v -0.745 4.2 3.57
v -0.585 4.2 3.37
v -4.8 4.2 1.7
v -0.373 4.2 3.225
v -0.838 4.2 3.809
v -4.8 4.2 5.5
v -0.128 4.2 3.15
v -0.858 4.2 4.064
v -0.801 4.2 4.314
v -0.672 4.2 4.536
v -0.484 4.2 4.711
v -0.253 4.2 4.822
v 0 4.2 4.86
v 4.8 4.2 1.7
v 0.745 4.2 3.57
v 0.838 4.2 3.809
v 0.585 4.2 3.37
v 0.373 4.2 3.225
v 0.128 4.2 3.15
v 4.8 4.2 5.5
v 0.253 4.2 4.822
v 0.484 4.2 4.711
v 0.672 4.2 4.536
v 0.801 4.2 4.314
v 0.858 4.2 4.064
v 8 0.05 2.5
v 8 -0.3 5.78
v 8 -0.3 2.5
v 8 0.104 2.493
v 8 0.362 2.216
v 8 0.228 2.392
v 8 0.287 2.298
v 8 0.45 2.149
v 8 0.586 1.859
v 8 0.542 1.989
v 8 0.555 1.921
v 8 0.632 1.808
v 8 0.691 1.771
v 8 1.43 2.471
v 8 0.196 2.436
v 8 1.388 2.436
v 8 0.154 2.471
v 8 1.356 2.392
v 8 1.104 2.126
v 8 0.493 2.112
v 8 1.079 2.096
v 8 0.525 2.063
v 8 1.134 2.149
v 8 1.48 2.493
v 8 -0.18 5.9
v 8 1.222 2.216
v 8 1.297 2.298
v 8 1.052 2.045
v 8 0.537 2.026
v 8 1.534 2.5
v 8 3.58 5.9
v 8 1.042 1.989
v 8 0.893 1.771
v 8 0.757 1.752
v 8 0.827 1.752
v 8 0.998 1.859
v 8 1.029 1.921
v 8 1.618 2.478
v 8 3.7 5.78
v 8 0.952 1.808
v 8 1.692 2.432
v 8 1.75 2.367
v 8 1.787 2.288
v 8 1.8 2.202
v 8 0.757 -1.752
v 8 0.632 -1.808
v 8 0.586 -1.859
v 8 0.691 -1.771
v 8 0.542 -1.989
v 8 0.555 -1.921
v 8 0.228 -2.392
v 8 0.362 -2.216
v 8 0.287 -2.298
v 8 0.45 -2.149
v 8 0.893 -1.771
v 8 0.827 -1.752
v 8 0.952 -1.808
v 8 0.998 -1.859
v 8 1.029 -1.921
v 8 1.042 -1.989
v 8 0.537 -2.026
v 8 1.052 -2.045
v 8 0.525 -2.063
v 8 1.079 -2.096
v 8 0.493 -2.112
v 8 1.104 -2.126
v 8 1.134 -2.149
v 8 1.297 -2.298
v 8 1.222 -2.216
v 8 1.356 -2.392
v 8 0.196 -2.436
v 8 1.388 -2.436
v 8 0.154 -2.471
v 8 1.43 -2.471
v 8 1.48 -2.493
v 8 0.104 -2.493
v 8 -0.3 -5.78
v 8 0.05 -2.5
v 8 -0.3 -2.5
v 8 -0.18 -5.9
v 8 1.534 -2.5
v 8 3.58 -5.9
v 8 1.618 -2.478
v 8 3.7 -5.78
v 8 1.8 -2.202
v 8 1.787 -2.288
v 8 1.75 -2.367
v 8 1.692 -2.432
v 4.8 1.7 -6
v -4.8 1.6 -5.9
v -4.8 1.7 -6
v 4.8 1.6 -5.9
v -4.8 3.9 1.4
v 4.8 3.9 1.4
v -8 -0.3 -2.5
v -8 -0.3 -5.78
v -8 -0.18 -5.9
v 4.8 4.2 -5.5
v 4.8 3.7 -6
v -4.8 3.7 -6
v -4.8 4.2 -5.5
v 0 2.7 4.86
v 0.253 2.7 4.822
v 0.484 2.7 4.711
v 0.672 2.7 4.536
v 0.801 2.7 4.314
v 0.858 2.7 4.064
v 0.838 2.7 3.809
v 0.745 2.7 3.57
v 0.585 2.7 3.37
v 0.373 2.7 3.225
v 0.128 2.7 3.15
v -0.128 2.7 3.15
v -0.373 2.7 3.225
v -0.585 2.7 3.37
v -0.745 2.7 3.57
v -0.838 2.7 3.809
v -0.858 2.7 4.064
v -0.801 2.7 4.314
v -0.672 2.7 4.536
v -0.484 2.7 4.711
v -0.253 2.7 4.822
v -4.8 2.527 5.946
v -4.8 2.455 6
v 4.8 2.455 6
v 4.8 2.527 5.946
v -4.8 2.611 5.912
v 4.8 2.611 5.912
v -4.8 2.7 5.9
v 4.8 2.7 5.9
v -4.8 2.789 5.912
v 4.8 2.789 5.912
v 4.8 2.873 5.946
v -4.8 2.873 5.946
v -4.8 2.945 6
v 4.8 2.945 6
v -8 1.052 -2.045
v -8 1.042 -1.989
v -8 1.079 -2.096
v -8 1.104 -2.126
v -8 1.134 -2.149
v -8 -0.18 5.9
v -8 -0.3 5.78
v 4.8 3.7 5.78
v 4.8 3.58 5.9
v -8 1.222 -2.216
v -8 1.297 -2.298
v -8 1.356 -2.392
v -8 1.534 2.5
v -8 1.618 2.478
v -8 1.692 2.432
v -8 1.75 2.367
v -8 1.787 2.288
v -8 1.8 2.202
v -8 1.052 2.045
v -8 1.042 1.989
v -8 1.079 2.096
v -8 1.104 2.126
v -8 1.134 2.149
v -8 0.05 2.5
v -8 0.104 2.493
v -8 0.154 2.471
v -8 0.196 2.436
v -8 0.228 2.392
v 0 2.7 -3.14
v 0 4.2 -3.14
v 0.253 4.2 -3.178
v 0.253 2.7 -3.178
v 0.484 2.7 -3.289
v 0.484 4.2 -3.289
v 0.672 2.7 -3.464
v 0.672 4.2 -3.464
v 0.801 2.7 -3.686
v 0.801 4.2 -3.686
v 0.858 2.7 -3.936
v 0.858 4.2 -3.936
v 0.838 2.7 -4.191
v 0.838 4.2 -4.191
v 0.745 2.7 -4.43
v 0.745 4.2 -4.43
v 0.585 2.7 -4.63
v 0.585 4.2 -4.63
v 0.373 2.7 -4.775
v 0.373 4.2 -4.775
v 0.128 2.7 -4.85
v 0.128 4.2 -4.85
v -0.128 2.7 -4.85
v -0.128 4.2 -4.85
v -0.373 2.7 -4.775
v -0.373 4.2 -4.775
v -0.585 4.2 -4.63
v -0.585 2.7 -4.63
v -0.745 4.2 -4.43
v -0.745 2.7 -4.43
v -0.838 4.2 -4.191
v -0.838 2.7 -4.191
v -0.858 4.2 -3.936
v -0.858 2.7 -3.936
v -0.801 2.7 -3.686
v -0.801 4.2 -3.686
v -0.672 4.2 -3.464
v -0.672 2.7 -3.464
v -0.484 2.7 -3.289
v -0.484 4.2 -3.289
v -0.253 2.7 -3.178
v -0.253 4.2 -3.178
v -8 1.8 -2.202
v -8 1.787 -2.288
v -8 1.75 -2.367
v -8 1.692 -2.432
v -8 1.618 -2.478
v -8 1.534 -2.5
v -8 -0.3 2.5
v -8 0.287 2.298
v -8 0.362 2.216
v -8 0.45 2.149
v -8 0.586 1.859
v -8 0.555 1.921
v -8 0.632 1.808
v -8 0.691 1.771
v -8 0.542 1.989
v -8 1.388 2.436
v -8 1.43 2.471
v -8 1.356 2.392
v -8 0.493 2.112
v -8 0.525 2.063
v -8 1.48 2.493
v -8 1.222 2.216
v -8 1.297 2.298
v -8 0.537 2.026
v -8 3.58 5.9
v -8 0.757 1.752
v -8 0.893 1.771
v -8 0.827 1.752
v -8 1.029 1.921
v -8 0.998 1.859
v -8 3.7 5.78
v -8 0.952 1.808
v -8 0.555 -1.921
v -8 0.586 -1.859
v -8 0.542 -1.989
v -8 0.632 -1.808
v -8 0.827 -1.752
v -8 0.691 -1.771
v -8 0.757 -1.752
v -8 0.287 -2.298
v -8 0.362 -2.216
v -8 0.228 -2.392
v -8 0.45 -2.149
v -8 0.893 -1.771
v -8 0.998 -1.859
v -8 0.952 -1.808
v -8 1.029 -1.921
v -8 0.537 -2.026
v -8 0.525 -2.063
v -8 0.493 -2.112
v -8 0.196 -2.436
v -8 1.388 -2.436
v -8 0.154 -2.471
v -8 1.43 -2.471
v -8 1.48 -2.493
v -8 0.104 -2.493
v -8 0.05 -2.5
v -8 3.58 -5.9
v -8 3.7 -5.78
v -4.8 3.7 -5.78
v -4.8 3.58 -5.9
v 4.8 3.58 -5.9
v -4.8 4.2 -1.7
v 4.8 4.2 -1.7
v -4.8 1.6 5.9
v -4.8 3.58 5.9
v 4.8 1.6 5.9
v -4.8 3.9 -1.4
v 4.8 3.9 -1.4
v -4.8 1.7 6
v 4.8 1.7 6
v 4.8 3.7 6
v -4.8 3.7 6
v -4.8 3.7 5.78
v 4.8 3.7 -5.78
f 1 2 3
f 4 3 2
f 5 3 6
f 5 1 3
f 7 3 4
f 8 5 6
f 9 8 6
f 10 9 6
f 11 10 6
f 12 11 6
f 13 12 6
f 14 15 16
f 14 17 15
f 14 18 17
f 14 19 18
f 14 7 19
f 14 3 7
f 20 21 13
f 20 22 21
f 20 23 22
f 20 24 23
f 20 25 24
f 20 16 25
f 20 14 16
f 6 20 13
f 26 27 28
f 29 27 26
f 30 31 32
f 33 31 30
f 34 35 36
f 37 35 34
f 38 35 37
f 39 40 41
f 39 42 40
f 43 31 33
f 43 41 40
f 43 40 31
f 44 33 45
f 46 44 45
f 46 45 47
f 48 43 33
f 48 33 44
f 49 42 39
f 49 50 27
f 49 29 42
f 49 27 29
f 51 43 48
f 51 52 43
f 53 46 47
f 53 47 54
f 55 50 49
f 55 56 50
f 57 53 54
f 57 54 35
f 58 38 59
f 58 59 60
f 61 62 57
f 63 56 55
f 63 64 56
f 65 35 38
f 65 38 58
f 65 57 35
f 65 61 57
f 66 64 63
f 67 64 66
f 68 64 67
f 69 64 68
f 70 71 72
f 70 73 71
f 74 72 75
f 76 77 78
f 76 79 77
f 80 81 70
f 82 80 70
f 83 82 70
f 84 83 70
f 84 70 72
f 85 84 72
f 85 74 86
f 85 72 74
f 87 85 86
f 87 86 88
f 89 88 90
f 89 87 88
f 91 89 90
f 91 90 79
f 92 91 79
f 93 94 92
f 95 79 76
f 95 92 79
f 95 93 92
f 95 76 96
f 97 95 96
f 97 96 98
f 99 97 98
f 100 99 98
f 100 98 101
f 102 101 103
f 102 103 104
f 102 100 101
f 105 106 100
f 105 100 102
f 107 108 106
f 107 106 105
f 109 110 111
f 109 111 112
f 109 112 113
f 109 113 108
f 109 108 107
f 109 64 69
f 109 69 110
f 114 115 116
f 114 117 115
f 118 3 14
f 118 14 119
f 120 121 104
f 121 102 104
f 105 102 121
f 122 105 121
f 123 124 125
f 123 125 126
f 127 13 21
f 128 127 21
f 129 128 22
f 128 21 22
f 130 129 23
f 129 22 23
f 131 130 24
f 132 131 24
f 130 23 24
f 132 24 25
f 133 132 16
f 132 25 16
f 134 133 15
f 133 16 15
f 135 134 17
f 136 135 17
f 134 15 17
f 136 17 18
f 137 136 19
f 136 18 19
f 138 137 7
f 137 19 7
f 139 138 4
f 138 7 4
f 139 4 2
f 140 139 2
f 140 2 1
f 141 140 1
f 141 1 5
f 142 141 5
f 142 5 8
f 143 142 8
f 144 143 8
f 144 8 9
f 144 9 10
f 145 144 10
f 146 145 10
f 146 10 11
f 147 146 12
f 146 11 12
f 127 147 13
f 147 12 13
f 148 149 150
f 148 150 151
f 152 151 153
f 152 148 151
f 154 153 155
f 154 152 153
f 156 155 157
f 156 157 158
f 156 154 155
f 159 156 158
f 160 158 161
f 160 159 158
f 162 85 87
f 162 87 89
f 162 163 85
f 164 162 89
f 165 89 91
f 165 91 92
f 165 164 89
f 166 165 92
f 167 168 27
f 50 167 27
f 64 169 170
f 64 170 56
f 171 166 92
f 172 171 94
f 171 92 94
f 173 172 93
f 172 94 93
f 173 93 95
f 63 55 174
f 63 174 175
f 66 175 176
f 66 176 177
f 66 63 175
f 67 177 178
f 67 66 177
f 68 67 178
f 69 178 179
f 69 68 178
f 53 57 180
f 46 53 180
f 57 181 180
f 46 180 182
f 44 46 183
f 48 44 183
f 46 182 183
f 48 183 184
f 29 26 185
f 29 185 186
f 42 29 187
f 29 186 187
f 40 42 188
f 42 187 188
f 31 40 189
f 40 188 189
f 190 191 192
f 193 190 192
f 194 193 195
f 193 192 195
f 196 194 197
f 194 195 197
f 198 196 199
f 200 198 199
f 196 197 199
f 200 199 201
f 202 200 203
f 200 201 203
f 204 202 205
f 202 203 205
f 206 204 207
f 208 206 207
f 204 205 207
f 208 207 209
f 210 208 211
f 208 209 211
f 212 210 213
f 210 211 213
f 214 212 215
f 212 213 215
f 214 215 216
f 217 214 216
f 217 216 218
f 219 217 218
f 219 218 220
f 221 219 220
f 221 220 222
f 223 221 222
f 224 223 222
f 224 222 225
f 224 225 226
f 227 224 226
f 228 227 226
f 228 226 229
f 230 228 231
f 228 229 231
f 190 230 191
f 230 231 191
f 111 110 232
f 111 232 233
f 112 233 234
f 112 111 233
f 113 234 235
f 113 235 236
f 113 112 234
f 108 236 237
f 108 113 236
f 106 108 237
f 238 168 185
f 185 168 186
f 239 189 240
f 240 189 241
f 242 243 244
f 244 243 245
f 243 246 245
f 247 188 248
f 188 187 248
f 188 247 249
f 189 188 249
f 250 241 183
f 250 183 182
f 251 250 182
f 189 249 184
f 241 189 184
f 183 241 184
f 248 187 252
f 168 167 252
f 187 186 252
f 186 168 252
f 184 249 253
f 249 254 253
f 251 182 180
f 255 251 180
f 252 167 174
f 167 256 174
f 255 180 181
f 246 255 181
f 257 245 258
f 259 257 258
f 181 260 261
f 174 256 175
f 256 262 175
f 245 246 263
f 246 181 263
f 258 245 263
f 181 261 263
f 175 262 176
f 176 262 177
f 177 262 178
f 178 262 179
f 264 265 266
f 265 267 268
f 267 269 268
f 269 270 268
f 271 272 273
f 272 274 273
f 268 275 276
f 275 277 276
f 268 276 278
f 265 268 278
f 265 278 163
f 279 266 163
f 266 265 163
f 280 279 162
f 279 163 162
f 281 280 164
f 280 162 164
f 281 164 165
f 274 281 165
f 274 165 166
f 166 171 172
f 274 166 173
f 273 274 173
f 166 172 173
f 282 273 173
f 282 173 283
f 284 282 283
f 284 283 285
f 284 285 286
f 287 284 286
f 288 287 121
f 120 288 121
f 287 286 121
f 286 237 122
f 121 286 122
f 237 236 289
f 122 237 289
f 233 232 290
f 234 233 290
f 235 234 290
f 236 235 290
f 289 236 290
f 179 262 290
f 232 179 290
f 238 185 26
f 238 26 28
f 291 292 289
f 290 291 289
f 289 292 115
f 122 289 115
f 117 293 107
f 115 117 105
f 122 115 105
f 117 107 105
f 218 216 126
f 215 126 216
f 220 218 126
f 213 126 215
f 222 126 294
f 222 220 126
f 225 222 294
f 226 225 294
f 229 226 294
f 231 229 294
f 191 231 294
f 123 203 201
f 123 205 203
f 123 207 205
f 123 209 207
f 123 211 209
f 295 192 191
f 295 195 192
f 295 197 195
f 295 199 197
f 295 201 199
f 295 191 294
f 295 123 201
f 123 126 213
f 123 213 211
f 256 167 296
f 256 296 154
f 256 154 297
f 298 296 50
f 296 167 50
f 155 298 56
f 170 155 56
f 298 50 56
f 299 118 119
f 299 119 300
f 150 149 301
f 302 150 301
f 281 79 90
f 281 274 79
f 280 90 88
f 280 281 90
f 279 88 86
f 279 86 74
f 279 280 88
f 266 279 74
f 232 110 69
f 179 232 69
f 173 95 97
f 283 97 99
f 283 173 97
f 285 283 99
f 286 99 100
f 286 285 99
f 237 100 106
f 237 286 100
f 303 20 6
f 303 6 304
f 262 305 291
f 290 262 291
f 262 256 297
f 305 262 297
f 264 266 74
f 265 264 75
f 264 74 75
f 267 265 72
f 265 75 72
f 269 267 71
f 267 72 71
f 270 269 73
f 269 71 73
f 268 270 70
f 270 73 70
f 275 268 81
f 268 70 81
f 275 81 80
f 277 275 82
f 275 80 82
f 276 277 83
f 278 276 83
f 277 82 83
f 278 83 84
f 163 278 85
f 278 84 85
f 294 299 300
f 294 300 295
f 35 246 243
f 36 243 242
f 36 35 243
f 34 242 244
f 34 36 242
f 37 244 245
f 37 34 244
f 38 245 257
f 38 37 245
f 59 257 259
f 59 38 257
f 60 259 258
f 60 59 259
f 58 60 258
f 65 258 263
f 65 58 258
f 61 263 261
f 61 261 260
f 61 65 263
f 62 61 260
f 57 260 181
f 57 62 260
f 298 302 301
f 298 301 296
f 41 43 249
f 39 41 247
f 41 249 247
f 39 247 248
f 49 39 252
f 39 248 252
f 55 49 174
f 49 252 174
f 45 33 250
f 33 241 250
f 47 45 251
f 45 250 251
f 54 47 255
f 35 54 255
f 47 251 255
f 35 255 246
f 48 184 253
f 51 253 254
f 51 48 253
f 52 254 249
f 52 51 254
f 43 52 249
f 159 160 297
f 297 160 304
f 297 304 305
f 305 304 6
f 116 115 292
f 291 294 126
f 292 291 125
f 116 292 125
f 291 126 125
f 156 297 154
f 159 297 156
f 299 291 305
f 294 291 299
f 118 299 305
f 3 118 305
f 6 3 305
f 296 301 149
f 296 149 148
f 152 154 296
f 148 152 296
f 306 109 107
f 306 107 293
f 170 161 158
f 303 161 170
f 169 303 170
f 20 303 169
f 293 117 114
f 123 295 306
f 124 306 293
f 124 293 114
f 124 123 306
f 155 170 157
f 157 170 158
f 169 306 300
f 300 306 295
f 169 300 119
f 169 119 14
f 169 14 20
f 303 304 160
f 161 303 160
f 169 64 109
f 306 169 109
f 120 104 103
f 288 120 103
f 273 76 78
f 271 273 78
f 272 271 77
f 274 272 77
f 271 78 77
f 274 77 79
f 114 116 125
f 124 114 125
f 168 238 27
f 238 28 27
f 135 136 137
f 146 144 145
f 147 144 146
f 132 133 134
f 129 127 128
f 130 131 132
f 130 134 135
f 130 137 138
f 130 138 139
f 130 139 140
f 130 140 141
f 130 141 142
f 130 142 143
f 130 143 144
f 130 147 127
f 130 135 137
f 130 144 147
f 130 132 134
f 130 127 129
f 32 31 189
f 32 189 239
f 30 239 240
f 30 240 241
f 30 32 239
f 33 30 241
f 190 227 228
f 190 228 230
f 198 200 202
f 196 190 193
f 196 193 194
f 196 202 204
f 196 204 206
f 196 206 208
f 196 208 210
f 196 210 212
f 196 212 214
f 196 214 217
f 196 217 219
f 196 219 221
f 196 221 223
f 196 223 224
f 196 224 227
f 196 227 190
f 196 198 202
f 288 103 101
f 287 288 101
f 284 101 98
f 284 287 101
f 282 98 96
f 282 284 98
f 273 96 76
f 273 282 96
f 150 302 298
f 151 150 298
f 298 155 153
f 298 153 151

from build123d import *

# Parameters (mm, degrees)
EXTRUDE_1_DEPTH     = 8
EXTRUDE_2_DEPTH     = 4.8
EXTRUDE_3_DEPTH     = 16
CUT_EXTRUDE_1_DEPTH = 15.747203125
CUT_EXTRUDE_START   = -4.8
SKETCH_5_R          = 0.35
CUT_EXTRUDE_2_DEPTH = 9.6
CHAMFER_1_SIZE      = 0.12
FILLET_1_R          = 0.2
FILLET_2_R          = 0.3
SKETCH_12_R         = 0.86
CUT_EXTRUDE_4_DEPTH = 1.5


with BuildPart() as part:
    # 草图1 → 凸台-拉伸1 (new, symmetric)
    with BuildSketch(Plane(origin=(0, 0, 0), x_dir=(0, 0, -1), z_dir=(1, 0, 0))):
        Polygon((-5.9, 3.7), (5.9, 3.7), (5.9, -0.3), (2.5, -0.3), (2.5, 1.8), (-2.5, 1.8), (-2.5, -0.3), (-5.9, -0.3), align=None)
    extrude(amount=EXTRUDE_1_DEPTH, both=True)

    # 草图2 → 凸台-拉伸2 (add, symmetric)
    with BuildSketch(Plane(origin=(0, 0, 0), x_dir=(0, 0, -1), z_dir=(1, 0, 0))):
        Polygon((6, 1.7), (6, 3.7), (5.5, 4.2), (-5.5, 4.2), (-6, 3.7), (-6, 1.7), (-5.9, 1.6), (-5.9, 3.7), (5.9, 3.7), (5.9, 1.6), align=None)
    extrude(amount=EXTRUDE_2_DEPTH, both=True)

    # 草图11 → 凸台-拉伸3 (add)
    with BuildSketch(Plane(origin=(8, 0, 0), x_dir=(0, 0, -1), z_dir=(1, 0, 0))):
        with BuildLine():
            Line((-2, 1.042), (-2.1, 1.042))
            ThreePointArc((-2.1, 1.042), (-2.260324923, 1.265329695), (-2.5, 1.4))
            Line((-2.5, 1.4), (-2.5, 0.184))
            ThreePointArc((-2.5, 0.184), (-2.260324923, 0.318670305), (-2.1, 0.542))
            Line((-2.1, 0.542), (-2, 0.542))
            ThreePointArc((-2, 0.542), (-1.75, 0.792), (-2, 1.042))
        make_face()
        with BuildLine():
            Line((2.5, 1.4), (2.5, 0.184))
            ThreePointArc((2.5, 0.184), (2.260324923, 0.318670305), (2.1, 0.542))
            Line((2.1, 0.542), (2, 0.542))
            ThreePointArc((2, 0.542), (1.75, 0.792), (2, 1.042))
            Line((2, 1.042), (2.1, 1.042))
            ThreePointArc((2.1, 1.042), (2.260324923, 1.265329695), (2.5, 1.4))
        make_face()
    extrude(amount=-EXTRUDE_3_DEPTH)

    # 草图3 → 切除-拉伸1 (cut, through all)
    with BuildSketch(Plane.ZY.offset(4.8)):
        Polygon((1.7, 4.2), (1.4, 3.9), (-1.4, 3.9), (-1.7, 4.2), align=None)
    extrude(amount=-CUT_EXTRUDE_1_DEPTH, mode=Mode.SUBTRACT)

    # 草图5 → 切除-拉伸2 (cut)
    with BuildSketch(Plane(origin=(0, 0, 0), x_dir=(0, 0, -1), z_dir=(1, 0, 0)).offset(CUT_EXTRUDE_START)):
        with Locations((-6.25, 2.7)):
            Circle(SKETCH_5_R)
    extrude(amount=CUT_EXTRUDE_2_DEPTH, mode=Mode.SUBTRACT)

    # 倒角1
    chamfer_1_edges = [part.edges().sort_by_distance(p)[0] for p in [
        (0, -0.3, 5.9),
        (6.4, 3.7, 5.9),
        (6.4, 3.7, -5.9),
        (0, -0.3, -5.9),
        (-6.4, 3.7, 5.9),
        (-6.4, 3.7, -5.9),
    ]]
    chamfer(chamfer_1_edges, length=CHAMFER_1_SIZE)

    # 圆角1
    fillet_1_edges = [part.edges().sort_by_distance(p)[0] for p in [
        (0, 0.184, -2.5),
        (0, 0.542, -2.1),
        (0, 1.042, -2.1),
        (0, 1.4, -2.5),
        (0, 0.184, 2.5),
        (0, 0.542, 2.1),
        (0, 1.042, 2.1),
        (0, 1.4, 2.5),
    ]]
    fillet(fillet_1_edges, radius=FILLET_1_R)

    # 圆角2
    # the kernel refuses this fillet: 0.3 mm, written as the material it adds along each edge
    with BuildSketch(Plane(origin=(8, 1.8, 2.5), x_dir=(0, -1, 0), z_dir=(-1, 0, 0))) as fillet_2_piece_1:
        with BuildLine():
            CenterArc((0.3, -0.298097301), FILLET_2_R, 96.456420664, 83.543579336)
            Line((0, -0.298097301), (-0.006, -0.298097301))
            Line((-0.006, -0.298097301), (-0.006, 0))
            Line((-0.006, 0), (0, 0.006))
            ThreePointArc((0, 0.006), (0.13313288, 0.006), (0.265591075, 0.005961946))
            Line((0.265591075, 0.005961946), (0.26626576, 0))
        make_face()
    extrude(amount=16)
    with BuildSketch(Plane(origin=(8, 1.8, -2.5), x_dir=(0, 0, 1), z_dir=(-1, 0, 0))) as fillet_2_piece_2:
        with BuildLine():
            CenterArc((0.298097301, -0.3), FILLET_2_R, 90, 83.543579336)
            Line((0, -0.26626576), (-0.005961946, -0.265591075))
            ThreePointArc((-0.005961946, -0.265591075), (-0.006, -0.13313288), (-0.006, 0))
            Line((-0.006, 0), (0, 0.006))
            Line((0, 0.006), (0.298097301, 0.006))
            Line((0.298097301, 0.006), (0.298097301, 0))
        make_face()
    extrude(amount=16)

    # 草图12 → 切除-拉伸4 (cut)
    with BuildSketch(Plane(origin=(0, 4.2, 0), x_dir=(1, 0, 0), z_dir=(0, 1, 0))):
        with Locations(Location((0, 4, 0), (0, 0, 270))):
            Circle(SKETCH_12_R)
        with Locations(Location((0, -4, 0), (0, 0, 270))):
            Circle(SKETCH_12_R)
    extrude(amount=-CUT_EXTRUDE_4_DEPTH, mode=Mode.SUBTRACT)


solid = part.part
